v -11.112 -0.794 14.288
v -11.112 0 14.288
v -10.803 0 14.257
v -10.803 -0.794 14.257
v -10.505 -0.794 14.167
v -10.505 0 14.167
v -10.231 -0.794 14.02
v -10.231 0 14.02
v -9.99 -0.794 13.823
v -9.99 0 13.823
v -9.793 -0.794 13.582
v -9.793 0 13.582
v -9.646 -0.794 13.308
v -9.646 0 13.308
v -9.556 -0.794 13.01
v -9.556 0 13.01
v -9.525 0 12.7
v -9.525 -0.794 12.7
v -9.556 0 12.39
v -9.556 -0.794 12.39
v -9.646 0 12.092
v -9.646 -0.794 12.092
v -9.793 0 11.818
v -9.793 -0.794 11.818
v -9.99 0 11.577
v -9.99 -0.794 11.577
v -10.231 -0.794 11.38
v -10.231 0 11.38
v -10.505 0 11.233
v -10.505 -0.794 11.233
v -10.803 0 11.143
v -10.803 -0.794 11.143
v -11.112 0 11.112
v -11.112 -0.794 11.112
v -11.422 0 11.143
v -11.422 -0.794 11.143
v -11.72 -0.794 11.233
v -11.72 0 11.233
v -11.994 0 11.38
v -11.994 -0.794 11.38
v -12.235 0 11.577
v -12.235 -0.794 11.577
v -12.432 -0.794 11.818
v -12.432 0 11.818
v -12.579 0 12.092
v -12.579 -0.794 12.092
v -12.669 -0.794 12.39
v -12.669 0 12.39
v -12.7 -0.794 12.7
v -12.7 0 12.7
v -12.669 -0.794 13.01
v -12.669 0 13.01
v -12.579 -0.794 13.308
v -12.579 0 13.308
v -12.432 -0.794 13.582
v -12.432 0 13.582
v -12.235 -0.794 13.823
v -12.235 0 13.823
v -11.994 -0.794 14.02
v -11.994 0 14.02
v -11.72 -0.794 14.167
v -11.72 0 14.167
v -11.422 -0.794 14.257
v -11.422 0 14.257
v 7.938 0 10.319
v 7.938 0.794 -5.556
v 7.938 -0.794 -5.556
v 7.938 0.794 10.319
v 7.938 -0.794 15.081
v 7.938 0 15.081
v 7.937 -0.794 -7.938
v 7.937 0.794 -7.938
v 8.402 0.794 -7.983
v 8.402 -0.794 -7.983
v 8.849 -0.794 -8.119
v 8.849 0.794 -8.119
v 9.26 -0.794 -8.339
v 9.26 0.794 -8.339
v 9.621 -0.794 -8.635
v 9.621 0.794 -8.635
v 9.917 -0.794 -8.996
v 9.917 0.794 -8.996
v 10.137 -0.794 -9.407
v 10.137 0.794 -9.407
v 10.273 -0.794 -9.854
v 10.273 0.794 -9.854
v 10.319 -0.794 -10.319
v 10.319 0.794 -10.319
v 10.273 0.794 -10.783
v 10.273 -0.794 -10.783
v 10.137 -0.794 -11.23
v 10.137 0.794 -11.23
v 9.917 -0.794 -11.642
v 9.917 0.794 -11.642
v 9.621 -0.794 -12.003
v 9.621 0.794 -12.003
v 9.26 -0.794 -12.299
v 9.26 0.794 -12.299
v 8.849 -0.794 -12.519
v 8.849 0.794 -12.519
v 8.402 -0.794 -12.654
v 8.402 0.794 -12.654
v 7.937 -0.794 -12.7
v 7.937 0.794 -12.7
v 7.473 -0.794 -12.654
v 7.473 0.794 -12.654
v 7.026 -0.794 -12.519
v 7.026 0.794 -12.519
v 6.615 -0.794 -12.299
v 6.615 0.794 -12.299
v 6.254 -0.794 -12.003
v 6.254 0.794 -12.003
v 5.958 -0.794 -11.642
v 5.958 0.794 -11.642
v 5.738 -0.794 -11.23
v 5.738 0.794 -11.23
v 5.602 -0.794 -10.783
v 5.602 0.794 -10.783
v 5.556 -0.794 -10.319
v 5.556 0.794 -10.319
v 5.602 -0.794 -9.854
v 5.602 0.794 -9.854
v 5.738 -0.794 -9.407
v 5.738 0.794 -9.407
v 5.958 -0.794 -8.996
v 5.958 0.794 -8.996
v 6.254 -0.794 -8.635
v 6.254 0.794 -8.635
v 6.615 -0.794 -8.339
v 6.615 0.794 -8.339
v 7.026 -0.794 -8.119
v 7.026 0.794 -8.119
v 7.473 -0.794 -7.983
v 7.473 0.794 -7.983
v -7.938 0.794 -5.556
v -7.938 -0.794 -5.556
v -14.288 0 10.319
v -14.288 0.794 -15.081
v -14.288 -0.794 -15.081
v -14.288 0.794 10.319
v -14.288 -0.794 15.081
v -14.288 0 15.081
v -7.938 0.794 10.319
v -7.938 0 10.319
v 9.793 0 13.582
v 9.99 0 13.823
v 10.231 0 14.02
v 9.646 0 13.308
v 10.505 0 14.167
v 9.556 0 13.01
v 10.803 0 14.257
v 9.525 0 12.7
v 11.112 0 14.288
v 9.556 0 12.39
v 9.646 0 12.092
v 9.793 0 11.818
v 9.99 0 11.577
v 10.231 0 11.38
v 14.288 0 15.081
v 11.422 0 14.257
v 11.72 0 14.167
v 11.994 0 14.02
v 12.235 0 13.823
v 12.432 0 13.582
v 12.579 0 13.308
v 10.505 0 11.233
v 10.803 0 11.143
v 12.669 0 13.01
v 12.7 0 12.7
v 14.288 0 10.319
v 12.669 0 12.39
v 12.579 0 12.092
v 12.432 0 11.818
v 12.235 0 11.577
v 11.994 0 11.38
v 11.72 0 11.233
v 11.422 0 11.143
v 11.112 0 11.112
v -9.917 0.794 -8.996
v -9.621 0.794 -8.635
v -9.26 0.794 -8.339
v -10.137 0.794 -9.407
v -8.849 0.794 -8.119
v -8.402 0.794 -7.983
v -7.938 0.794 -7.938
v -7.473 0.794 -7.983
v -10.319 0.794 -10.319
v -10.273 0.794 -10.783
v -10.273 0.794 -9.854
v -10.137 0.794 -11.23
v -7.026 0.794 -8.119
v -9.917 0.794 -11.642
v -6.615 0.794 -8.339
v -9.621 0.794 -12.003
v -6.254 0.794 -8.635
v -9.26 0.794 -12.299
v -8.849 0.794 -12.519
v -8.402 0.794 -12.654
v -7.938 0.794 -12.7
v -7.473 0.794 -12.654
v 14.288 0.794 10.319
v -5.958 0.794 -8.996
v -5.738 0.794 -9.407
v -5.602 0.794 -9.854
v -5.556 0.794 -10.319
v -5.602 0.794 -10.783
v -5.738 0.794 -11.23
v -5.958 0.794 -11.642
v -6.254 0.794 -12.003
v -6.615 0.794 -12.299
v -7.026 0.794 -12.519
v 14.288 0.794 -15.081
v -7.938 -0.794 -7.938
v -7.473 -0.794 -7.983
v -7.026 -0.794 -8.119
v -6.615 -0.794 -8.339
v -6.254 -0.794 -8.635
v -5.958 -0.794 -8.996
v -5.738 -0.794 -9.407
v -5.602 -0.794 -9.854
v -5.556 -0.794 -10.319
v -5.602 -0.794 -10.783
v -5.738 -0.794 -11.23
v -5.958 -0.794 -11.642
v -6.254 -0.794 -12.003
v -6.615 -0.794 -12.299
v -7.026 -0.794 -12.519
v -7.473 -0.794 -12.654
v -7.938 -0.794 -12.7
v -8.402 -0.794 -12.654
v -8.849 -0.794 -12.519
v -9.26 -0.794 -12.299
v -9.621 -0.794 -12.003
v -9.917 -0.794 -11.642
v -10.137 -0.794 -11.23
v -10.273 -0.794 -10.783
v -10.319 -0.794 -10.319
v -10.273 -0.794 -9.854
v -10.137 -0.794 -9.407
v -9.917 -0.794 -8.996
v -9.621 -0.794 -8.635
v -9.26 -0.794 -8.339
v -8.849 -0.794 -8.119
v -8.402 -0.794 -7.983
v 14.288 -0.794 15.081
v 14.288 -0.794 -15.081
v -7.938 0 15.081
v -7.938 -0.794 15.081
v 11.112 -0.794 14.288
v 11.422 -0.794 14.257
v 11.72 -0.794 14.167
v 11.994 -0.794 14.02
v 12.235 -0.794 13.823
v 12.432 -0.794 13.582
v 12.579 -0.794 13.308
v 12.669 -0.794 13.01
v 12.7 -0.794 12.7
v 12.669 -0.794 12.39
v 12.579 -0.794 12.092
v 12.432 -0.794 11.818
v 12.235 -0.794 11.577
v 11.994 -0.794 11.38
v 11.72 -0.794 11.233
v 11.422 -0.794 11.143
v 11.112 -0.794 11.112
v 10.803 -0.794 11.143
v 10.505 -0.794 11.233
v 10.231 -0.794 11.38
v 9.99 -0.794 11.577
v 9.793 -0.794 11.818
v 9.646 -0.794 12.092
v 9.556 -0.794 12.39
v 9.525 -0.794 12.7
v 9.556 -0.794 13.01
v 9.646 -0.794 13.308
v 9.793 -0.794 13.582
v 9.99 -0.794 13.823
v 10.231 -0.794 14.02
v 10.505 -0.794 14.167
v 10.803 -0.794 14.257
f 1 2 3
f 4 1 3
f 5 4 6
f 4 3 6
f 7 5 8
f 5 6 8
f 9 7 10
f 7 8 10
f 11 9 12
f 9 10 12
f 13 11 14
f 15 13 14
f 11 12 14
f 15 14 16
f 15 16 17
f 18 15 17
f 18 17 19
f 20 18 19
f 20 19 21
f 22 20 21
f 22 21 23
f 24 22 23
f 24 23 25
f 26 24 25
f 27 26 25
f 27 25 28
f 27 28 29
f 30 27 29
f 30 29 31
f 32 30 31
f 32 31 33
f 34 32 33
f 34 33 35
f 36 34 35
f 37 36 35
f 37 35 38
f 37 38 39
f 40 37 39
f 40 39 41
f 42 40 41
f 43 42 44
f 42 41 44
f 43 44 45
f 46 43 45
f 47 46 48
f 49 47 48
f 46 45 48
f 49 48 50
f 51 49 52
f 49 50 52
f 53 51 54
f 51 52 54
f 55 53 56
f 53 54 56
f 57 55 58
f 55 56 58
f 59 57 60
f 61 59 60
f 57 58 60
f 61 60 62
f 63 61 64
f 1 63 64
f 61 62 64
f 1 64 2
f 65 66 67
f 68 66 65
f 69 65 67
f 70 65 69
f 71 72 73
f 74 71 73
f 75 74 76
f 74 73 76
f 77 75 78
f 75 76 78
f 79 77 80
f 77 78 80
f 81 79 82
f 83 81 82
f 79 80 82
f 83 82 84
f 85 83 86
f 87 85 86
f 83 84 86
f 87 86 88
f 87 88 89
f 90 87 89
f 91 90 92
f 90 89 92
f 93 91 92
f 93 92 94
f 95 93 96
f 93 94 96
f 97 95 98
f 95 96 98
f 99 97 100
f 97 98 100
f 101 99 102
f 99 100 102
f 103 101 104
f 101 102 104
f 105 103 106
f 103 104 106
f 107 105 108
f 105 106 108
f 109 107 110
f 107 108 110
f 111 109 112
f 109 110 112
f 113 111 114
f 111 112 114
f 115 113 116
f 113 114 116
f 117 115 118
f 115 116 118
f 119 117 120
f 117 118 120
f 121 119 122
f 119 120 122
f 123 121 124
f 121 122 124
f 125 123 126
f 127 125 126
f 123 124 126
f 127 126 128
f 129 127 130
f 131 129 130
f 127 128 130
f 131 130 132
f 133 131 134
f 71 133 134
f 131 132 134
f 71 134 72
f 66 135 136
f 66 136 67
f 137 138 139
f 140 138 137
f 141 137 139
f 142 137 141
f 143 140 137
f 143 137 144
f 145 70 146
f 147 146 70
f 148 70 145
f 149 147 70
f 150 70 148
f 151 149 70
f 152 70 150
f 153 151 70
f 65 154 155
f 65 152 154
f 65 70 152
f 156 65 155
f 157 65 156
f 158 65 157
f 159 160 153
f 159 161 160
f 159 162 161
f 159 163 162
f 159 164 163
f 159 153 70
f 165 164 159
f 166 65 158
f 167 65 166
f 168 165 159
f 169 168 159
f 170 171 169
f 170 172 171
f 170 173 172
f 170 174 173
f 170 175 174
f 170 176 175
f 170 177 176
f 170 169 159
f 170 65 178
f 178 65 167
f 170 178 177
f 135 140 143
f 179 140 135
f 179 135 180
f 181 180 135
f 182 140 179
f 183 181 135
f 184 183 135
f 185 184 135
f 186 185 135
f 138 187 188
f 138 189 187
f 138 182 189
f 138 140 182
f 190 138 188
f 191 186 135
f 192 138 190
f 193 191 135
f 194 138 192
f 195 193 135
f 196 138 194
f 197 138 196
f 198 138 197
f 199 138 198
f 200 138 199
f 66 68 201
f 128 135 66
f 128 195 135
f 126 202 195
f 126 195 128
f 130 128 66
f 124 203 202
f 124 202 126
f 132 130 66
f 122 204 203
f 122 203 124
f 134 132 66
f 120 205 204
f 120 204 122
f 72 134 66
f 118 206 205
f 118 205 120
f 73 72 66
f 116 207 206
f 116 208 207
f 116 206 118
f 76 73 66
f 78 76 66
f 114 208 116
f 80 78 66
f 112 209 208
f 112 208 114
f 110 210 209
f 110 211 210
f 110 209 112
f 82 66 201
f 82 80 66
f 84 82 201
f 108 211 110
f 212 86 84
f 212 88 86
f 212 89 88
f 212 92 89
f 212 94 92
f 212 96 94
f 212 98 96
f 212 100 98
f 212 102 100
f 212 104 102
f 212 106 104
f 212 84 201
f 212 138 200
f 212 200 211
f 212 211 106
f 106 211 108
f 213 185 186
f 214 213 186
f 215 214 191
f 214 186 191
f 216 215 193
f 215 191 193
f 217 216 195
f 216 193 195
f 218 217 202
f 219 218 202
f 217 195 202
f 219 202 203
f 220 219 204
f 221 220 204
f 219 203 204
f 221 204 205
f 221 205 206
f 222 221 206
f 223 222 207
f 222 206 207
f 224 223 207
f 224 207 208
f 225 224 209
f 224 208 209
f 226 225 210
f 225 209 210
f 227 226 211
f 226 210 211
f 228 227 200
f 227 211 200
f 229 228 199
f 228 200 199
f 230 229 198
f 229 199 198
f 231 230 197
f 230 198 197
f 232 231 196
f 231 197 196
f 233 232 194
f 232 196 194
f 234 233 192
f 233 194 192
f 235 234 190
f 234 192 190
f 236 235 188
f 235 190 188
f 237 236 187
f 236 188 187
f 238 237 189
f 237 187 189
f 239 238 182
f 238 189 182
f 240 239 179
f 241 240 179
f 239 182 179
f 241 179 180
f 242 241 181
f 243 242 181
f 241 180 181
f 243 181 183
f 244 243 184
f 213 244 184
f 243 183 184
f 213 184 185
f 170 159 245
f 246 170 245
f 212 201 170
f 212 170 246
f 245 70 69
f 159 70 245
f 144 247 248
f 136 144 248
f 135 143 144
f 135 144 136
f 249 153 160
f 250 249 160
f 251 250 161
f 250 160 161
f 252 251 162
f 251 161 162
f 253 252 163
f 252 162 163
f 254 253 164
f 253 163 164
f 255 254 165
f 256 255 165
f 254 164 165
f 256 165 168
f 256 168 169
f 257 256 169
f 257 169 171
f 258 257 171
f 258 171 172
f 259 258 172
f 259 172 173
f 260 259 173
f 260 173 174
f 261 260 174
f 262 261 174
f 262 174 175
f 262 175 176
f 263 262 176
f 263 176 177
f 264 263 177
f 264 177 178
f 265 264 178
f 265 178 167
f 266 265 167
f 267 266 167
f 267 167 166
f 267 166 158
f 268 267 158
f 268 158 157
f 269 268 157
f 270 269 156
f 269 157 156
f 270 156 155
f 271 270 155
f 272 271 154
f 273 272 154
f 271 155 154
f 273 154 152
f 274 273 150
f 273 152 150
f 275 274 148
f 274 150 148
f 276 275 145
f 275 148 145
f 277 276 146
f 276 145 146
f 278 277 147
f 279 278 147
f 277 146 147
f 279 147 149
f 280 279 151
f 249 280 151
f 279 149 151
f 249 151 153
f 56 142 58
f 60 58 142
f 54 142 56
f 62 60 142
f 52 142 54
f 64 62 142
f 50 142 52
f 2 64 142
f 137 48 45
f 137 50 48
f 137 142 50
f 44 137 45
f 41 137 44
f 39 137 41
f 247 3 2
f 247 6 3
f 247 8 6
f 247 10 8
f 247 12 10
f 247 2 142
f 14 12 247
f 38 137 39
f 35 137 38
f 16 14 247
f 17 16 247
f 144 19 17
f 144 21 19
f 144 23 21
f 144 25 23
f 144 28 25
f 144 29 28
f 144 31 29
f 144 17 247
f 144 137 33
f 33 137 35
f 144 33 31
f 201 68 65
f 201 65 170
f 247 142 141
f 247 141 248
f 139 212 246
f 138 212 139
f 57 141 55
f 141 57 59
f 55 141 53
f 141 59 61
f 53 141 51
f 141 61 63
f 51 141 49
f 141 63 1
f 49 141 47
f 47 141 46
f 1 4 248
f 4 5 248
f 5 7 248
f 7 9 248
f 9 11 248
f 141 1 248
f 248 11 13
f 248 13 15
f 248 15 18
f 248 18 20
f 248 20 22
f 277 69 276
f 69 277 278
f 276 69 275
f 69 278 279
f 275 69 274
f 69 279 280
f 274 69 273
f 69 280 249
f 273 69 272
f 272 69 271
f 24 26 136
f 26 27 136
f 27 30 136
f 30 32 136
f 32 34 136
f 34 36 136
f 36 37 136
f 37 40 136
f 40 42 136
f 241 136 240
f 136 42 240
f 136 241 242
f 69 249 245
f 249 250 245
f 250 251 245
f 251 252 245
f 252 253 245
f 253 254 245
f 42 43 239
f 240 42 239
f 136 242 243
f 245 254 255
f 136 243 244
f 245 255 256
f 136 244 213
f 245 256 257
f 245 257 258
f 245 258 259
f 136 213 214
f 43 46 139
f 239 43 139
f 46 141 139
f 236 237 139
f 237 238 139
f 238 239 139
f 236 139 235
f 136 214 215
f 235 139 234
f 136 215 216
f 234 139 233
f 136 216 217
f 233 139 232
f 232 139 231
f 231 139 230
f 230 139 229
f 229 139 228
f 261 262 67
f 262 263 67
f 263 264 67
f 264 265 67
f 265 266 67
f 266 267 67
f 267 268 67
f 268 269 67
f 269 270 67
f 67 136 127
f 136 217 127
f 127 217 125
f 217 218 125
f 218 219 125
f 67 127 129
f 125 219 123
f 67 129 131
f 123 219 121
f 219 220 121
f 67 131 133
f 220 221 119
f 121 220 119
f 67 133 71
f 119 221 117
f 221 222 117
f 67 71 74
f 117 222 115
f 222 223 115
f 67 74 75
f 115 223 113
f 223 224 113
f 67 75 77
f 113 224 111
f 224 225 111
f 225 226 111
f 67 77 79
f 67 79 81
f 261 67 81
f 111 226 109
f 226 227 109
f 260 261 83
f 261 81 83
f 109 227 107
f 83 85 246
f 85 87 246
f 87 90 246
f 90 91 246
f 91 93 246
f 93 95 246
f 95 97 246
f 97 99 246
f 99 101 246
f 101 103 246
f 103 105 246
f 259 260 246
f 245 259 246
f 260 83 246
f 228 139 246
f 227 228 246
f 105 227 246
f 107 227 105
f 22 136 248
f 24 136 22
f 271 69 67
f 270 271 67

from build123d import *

# Parameters (mm, degrees)
BOSS_EXTRUDE1_DEPTH = 0.79375
SKETCH2_W           = 6.35
SKETCH2_H           = 4.7625
CUT_EXTRUDE1_DEPTH  = 0.79375
SKETCH3_R           = 1.5875
SKETCH3_R_2         = 2.38125
CUT_EXTRUDE2_DEPTH  = 1.5875


with BuildPart() as part:
    # Sketch1 → Boss-Extrude1 (new, symmetric)
    with BuildSketch(Plane(origin=(0, 0, 0), x_dir=(1, 0, 0), z_dir=(0, 1, 0))):
        Polygon((14.2875, 15.08125), (-14.2875, 15.08125), (-14.2875, -15.08125), (-7.9375, -15.08125), (-7.9375, 5.55625), (7.9375, 5.55625), (7.9375, -15.08125), (14.2875, -15.08125), align=None)
    extrude(amount=BOSS_EXTRUDE1_DEPTH, both=True)

    # Sketch2 → Cut-Extrude1 (cut)
    with BuildSketch(Plane(origin=(0, 0.79375, 0), x_dir=(1, 0, 0), z_dir=(0, 1, 0))):
        with Locations((-11.1125, -12.7)):
            Rectangle(SKETCH2_W, SKETCH2_H)
        with Locations((11.1125, -12.7)):
            Rectangle(SKETCH2_W, SKETCH2_H)
    extrude(amount=-CUT_EXTRUDE1_DEPTH, mode=Mode.SUBTRACT)

    # Sketch3 → Cut-Extrude2 (cut)
    with BuildSketch(Plane(origin=(0, 0.79375, 0), x_dir=(1, 0, 0), z_dir=(0, 1, 0))):
        with Locations(Location((-11.1125, -12.7, 0), (0, 0, 270))):
            Circle(SKETCH3_R)
        with Locations(Location((-7.9375, 10.31875, 0), (0, 0, 270))):
            Circle(SKETCH3_R_2)
        with Locations(Location((11.1125, -12.7, 0), (0, 0, 270))):
            Circle(SKETCH3_R)
        with Locations(Location((7.9375, 10.31875, 0), (0, 0, 270))):
            Circle(SKETCH3_R_2)
    extrude(amount=-CUT_EXTRUDE2_DEPTH, mode=Mode.SUBTRACT)


solid = part.part
